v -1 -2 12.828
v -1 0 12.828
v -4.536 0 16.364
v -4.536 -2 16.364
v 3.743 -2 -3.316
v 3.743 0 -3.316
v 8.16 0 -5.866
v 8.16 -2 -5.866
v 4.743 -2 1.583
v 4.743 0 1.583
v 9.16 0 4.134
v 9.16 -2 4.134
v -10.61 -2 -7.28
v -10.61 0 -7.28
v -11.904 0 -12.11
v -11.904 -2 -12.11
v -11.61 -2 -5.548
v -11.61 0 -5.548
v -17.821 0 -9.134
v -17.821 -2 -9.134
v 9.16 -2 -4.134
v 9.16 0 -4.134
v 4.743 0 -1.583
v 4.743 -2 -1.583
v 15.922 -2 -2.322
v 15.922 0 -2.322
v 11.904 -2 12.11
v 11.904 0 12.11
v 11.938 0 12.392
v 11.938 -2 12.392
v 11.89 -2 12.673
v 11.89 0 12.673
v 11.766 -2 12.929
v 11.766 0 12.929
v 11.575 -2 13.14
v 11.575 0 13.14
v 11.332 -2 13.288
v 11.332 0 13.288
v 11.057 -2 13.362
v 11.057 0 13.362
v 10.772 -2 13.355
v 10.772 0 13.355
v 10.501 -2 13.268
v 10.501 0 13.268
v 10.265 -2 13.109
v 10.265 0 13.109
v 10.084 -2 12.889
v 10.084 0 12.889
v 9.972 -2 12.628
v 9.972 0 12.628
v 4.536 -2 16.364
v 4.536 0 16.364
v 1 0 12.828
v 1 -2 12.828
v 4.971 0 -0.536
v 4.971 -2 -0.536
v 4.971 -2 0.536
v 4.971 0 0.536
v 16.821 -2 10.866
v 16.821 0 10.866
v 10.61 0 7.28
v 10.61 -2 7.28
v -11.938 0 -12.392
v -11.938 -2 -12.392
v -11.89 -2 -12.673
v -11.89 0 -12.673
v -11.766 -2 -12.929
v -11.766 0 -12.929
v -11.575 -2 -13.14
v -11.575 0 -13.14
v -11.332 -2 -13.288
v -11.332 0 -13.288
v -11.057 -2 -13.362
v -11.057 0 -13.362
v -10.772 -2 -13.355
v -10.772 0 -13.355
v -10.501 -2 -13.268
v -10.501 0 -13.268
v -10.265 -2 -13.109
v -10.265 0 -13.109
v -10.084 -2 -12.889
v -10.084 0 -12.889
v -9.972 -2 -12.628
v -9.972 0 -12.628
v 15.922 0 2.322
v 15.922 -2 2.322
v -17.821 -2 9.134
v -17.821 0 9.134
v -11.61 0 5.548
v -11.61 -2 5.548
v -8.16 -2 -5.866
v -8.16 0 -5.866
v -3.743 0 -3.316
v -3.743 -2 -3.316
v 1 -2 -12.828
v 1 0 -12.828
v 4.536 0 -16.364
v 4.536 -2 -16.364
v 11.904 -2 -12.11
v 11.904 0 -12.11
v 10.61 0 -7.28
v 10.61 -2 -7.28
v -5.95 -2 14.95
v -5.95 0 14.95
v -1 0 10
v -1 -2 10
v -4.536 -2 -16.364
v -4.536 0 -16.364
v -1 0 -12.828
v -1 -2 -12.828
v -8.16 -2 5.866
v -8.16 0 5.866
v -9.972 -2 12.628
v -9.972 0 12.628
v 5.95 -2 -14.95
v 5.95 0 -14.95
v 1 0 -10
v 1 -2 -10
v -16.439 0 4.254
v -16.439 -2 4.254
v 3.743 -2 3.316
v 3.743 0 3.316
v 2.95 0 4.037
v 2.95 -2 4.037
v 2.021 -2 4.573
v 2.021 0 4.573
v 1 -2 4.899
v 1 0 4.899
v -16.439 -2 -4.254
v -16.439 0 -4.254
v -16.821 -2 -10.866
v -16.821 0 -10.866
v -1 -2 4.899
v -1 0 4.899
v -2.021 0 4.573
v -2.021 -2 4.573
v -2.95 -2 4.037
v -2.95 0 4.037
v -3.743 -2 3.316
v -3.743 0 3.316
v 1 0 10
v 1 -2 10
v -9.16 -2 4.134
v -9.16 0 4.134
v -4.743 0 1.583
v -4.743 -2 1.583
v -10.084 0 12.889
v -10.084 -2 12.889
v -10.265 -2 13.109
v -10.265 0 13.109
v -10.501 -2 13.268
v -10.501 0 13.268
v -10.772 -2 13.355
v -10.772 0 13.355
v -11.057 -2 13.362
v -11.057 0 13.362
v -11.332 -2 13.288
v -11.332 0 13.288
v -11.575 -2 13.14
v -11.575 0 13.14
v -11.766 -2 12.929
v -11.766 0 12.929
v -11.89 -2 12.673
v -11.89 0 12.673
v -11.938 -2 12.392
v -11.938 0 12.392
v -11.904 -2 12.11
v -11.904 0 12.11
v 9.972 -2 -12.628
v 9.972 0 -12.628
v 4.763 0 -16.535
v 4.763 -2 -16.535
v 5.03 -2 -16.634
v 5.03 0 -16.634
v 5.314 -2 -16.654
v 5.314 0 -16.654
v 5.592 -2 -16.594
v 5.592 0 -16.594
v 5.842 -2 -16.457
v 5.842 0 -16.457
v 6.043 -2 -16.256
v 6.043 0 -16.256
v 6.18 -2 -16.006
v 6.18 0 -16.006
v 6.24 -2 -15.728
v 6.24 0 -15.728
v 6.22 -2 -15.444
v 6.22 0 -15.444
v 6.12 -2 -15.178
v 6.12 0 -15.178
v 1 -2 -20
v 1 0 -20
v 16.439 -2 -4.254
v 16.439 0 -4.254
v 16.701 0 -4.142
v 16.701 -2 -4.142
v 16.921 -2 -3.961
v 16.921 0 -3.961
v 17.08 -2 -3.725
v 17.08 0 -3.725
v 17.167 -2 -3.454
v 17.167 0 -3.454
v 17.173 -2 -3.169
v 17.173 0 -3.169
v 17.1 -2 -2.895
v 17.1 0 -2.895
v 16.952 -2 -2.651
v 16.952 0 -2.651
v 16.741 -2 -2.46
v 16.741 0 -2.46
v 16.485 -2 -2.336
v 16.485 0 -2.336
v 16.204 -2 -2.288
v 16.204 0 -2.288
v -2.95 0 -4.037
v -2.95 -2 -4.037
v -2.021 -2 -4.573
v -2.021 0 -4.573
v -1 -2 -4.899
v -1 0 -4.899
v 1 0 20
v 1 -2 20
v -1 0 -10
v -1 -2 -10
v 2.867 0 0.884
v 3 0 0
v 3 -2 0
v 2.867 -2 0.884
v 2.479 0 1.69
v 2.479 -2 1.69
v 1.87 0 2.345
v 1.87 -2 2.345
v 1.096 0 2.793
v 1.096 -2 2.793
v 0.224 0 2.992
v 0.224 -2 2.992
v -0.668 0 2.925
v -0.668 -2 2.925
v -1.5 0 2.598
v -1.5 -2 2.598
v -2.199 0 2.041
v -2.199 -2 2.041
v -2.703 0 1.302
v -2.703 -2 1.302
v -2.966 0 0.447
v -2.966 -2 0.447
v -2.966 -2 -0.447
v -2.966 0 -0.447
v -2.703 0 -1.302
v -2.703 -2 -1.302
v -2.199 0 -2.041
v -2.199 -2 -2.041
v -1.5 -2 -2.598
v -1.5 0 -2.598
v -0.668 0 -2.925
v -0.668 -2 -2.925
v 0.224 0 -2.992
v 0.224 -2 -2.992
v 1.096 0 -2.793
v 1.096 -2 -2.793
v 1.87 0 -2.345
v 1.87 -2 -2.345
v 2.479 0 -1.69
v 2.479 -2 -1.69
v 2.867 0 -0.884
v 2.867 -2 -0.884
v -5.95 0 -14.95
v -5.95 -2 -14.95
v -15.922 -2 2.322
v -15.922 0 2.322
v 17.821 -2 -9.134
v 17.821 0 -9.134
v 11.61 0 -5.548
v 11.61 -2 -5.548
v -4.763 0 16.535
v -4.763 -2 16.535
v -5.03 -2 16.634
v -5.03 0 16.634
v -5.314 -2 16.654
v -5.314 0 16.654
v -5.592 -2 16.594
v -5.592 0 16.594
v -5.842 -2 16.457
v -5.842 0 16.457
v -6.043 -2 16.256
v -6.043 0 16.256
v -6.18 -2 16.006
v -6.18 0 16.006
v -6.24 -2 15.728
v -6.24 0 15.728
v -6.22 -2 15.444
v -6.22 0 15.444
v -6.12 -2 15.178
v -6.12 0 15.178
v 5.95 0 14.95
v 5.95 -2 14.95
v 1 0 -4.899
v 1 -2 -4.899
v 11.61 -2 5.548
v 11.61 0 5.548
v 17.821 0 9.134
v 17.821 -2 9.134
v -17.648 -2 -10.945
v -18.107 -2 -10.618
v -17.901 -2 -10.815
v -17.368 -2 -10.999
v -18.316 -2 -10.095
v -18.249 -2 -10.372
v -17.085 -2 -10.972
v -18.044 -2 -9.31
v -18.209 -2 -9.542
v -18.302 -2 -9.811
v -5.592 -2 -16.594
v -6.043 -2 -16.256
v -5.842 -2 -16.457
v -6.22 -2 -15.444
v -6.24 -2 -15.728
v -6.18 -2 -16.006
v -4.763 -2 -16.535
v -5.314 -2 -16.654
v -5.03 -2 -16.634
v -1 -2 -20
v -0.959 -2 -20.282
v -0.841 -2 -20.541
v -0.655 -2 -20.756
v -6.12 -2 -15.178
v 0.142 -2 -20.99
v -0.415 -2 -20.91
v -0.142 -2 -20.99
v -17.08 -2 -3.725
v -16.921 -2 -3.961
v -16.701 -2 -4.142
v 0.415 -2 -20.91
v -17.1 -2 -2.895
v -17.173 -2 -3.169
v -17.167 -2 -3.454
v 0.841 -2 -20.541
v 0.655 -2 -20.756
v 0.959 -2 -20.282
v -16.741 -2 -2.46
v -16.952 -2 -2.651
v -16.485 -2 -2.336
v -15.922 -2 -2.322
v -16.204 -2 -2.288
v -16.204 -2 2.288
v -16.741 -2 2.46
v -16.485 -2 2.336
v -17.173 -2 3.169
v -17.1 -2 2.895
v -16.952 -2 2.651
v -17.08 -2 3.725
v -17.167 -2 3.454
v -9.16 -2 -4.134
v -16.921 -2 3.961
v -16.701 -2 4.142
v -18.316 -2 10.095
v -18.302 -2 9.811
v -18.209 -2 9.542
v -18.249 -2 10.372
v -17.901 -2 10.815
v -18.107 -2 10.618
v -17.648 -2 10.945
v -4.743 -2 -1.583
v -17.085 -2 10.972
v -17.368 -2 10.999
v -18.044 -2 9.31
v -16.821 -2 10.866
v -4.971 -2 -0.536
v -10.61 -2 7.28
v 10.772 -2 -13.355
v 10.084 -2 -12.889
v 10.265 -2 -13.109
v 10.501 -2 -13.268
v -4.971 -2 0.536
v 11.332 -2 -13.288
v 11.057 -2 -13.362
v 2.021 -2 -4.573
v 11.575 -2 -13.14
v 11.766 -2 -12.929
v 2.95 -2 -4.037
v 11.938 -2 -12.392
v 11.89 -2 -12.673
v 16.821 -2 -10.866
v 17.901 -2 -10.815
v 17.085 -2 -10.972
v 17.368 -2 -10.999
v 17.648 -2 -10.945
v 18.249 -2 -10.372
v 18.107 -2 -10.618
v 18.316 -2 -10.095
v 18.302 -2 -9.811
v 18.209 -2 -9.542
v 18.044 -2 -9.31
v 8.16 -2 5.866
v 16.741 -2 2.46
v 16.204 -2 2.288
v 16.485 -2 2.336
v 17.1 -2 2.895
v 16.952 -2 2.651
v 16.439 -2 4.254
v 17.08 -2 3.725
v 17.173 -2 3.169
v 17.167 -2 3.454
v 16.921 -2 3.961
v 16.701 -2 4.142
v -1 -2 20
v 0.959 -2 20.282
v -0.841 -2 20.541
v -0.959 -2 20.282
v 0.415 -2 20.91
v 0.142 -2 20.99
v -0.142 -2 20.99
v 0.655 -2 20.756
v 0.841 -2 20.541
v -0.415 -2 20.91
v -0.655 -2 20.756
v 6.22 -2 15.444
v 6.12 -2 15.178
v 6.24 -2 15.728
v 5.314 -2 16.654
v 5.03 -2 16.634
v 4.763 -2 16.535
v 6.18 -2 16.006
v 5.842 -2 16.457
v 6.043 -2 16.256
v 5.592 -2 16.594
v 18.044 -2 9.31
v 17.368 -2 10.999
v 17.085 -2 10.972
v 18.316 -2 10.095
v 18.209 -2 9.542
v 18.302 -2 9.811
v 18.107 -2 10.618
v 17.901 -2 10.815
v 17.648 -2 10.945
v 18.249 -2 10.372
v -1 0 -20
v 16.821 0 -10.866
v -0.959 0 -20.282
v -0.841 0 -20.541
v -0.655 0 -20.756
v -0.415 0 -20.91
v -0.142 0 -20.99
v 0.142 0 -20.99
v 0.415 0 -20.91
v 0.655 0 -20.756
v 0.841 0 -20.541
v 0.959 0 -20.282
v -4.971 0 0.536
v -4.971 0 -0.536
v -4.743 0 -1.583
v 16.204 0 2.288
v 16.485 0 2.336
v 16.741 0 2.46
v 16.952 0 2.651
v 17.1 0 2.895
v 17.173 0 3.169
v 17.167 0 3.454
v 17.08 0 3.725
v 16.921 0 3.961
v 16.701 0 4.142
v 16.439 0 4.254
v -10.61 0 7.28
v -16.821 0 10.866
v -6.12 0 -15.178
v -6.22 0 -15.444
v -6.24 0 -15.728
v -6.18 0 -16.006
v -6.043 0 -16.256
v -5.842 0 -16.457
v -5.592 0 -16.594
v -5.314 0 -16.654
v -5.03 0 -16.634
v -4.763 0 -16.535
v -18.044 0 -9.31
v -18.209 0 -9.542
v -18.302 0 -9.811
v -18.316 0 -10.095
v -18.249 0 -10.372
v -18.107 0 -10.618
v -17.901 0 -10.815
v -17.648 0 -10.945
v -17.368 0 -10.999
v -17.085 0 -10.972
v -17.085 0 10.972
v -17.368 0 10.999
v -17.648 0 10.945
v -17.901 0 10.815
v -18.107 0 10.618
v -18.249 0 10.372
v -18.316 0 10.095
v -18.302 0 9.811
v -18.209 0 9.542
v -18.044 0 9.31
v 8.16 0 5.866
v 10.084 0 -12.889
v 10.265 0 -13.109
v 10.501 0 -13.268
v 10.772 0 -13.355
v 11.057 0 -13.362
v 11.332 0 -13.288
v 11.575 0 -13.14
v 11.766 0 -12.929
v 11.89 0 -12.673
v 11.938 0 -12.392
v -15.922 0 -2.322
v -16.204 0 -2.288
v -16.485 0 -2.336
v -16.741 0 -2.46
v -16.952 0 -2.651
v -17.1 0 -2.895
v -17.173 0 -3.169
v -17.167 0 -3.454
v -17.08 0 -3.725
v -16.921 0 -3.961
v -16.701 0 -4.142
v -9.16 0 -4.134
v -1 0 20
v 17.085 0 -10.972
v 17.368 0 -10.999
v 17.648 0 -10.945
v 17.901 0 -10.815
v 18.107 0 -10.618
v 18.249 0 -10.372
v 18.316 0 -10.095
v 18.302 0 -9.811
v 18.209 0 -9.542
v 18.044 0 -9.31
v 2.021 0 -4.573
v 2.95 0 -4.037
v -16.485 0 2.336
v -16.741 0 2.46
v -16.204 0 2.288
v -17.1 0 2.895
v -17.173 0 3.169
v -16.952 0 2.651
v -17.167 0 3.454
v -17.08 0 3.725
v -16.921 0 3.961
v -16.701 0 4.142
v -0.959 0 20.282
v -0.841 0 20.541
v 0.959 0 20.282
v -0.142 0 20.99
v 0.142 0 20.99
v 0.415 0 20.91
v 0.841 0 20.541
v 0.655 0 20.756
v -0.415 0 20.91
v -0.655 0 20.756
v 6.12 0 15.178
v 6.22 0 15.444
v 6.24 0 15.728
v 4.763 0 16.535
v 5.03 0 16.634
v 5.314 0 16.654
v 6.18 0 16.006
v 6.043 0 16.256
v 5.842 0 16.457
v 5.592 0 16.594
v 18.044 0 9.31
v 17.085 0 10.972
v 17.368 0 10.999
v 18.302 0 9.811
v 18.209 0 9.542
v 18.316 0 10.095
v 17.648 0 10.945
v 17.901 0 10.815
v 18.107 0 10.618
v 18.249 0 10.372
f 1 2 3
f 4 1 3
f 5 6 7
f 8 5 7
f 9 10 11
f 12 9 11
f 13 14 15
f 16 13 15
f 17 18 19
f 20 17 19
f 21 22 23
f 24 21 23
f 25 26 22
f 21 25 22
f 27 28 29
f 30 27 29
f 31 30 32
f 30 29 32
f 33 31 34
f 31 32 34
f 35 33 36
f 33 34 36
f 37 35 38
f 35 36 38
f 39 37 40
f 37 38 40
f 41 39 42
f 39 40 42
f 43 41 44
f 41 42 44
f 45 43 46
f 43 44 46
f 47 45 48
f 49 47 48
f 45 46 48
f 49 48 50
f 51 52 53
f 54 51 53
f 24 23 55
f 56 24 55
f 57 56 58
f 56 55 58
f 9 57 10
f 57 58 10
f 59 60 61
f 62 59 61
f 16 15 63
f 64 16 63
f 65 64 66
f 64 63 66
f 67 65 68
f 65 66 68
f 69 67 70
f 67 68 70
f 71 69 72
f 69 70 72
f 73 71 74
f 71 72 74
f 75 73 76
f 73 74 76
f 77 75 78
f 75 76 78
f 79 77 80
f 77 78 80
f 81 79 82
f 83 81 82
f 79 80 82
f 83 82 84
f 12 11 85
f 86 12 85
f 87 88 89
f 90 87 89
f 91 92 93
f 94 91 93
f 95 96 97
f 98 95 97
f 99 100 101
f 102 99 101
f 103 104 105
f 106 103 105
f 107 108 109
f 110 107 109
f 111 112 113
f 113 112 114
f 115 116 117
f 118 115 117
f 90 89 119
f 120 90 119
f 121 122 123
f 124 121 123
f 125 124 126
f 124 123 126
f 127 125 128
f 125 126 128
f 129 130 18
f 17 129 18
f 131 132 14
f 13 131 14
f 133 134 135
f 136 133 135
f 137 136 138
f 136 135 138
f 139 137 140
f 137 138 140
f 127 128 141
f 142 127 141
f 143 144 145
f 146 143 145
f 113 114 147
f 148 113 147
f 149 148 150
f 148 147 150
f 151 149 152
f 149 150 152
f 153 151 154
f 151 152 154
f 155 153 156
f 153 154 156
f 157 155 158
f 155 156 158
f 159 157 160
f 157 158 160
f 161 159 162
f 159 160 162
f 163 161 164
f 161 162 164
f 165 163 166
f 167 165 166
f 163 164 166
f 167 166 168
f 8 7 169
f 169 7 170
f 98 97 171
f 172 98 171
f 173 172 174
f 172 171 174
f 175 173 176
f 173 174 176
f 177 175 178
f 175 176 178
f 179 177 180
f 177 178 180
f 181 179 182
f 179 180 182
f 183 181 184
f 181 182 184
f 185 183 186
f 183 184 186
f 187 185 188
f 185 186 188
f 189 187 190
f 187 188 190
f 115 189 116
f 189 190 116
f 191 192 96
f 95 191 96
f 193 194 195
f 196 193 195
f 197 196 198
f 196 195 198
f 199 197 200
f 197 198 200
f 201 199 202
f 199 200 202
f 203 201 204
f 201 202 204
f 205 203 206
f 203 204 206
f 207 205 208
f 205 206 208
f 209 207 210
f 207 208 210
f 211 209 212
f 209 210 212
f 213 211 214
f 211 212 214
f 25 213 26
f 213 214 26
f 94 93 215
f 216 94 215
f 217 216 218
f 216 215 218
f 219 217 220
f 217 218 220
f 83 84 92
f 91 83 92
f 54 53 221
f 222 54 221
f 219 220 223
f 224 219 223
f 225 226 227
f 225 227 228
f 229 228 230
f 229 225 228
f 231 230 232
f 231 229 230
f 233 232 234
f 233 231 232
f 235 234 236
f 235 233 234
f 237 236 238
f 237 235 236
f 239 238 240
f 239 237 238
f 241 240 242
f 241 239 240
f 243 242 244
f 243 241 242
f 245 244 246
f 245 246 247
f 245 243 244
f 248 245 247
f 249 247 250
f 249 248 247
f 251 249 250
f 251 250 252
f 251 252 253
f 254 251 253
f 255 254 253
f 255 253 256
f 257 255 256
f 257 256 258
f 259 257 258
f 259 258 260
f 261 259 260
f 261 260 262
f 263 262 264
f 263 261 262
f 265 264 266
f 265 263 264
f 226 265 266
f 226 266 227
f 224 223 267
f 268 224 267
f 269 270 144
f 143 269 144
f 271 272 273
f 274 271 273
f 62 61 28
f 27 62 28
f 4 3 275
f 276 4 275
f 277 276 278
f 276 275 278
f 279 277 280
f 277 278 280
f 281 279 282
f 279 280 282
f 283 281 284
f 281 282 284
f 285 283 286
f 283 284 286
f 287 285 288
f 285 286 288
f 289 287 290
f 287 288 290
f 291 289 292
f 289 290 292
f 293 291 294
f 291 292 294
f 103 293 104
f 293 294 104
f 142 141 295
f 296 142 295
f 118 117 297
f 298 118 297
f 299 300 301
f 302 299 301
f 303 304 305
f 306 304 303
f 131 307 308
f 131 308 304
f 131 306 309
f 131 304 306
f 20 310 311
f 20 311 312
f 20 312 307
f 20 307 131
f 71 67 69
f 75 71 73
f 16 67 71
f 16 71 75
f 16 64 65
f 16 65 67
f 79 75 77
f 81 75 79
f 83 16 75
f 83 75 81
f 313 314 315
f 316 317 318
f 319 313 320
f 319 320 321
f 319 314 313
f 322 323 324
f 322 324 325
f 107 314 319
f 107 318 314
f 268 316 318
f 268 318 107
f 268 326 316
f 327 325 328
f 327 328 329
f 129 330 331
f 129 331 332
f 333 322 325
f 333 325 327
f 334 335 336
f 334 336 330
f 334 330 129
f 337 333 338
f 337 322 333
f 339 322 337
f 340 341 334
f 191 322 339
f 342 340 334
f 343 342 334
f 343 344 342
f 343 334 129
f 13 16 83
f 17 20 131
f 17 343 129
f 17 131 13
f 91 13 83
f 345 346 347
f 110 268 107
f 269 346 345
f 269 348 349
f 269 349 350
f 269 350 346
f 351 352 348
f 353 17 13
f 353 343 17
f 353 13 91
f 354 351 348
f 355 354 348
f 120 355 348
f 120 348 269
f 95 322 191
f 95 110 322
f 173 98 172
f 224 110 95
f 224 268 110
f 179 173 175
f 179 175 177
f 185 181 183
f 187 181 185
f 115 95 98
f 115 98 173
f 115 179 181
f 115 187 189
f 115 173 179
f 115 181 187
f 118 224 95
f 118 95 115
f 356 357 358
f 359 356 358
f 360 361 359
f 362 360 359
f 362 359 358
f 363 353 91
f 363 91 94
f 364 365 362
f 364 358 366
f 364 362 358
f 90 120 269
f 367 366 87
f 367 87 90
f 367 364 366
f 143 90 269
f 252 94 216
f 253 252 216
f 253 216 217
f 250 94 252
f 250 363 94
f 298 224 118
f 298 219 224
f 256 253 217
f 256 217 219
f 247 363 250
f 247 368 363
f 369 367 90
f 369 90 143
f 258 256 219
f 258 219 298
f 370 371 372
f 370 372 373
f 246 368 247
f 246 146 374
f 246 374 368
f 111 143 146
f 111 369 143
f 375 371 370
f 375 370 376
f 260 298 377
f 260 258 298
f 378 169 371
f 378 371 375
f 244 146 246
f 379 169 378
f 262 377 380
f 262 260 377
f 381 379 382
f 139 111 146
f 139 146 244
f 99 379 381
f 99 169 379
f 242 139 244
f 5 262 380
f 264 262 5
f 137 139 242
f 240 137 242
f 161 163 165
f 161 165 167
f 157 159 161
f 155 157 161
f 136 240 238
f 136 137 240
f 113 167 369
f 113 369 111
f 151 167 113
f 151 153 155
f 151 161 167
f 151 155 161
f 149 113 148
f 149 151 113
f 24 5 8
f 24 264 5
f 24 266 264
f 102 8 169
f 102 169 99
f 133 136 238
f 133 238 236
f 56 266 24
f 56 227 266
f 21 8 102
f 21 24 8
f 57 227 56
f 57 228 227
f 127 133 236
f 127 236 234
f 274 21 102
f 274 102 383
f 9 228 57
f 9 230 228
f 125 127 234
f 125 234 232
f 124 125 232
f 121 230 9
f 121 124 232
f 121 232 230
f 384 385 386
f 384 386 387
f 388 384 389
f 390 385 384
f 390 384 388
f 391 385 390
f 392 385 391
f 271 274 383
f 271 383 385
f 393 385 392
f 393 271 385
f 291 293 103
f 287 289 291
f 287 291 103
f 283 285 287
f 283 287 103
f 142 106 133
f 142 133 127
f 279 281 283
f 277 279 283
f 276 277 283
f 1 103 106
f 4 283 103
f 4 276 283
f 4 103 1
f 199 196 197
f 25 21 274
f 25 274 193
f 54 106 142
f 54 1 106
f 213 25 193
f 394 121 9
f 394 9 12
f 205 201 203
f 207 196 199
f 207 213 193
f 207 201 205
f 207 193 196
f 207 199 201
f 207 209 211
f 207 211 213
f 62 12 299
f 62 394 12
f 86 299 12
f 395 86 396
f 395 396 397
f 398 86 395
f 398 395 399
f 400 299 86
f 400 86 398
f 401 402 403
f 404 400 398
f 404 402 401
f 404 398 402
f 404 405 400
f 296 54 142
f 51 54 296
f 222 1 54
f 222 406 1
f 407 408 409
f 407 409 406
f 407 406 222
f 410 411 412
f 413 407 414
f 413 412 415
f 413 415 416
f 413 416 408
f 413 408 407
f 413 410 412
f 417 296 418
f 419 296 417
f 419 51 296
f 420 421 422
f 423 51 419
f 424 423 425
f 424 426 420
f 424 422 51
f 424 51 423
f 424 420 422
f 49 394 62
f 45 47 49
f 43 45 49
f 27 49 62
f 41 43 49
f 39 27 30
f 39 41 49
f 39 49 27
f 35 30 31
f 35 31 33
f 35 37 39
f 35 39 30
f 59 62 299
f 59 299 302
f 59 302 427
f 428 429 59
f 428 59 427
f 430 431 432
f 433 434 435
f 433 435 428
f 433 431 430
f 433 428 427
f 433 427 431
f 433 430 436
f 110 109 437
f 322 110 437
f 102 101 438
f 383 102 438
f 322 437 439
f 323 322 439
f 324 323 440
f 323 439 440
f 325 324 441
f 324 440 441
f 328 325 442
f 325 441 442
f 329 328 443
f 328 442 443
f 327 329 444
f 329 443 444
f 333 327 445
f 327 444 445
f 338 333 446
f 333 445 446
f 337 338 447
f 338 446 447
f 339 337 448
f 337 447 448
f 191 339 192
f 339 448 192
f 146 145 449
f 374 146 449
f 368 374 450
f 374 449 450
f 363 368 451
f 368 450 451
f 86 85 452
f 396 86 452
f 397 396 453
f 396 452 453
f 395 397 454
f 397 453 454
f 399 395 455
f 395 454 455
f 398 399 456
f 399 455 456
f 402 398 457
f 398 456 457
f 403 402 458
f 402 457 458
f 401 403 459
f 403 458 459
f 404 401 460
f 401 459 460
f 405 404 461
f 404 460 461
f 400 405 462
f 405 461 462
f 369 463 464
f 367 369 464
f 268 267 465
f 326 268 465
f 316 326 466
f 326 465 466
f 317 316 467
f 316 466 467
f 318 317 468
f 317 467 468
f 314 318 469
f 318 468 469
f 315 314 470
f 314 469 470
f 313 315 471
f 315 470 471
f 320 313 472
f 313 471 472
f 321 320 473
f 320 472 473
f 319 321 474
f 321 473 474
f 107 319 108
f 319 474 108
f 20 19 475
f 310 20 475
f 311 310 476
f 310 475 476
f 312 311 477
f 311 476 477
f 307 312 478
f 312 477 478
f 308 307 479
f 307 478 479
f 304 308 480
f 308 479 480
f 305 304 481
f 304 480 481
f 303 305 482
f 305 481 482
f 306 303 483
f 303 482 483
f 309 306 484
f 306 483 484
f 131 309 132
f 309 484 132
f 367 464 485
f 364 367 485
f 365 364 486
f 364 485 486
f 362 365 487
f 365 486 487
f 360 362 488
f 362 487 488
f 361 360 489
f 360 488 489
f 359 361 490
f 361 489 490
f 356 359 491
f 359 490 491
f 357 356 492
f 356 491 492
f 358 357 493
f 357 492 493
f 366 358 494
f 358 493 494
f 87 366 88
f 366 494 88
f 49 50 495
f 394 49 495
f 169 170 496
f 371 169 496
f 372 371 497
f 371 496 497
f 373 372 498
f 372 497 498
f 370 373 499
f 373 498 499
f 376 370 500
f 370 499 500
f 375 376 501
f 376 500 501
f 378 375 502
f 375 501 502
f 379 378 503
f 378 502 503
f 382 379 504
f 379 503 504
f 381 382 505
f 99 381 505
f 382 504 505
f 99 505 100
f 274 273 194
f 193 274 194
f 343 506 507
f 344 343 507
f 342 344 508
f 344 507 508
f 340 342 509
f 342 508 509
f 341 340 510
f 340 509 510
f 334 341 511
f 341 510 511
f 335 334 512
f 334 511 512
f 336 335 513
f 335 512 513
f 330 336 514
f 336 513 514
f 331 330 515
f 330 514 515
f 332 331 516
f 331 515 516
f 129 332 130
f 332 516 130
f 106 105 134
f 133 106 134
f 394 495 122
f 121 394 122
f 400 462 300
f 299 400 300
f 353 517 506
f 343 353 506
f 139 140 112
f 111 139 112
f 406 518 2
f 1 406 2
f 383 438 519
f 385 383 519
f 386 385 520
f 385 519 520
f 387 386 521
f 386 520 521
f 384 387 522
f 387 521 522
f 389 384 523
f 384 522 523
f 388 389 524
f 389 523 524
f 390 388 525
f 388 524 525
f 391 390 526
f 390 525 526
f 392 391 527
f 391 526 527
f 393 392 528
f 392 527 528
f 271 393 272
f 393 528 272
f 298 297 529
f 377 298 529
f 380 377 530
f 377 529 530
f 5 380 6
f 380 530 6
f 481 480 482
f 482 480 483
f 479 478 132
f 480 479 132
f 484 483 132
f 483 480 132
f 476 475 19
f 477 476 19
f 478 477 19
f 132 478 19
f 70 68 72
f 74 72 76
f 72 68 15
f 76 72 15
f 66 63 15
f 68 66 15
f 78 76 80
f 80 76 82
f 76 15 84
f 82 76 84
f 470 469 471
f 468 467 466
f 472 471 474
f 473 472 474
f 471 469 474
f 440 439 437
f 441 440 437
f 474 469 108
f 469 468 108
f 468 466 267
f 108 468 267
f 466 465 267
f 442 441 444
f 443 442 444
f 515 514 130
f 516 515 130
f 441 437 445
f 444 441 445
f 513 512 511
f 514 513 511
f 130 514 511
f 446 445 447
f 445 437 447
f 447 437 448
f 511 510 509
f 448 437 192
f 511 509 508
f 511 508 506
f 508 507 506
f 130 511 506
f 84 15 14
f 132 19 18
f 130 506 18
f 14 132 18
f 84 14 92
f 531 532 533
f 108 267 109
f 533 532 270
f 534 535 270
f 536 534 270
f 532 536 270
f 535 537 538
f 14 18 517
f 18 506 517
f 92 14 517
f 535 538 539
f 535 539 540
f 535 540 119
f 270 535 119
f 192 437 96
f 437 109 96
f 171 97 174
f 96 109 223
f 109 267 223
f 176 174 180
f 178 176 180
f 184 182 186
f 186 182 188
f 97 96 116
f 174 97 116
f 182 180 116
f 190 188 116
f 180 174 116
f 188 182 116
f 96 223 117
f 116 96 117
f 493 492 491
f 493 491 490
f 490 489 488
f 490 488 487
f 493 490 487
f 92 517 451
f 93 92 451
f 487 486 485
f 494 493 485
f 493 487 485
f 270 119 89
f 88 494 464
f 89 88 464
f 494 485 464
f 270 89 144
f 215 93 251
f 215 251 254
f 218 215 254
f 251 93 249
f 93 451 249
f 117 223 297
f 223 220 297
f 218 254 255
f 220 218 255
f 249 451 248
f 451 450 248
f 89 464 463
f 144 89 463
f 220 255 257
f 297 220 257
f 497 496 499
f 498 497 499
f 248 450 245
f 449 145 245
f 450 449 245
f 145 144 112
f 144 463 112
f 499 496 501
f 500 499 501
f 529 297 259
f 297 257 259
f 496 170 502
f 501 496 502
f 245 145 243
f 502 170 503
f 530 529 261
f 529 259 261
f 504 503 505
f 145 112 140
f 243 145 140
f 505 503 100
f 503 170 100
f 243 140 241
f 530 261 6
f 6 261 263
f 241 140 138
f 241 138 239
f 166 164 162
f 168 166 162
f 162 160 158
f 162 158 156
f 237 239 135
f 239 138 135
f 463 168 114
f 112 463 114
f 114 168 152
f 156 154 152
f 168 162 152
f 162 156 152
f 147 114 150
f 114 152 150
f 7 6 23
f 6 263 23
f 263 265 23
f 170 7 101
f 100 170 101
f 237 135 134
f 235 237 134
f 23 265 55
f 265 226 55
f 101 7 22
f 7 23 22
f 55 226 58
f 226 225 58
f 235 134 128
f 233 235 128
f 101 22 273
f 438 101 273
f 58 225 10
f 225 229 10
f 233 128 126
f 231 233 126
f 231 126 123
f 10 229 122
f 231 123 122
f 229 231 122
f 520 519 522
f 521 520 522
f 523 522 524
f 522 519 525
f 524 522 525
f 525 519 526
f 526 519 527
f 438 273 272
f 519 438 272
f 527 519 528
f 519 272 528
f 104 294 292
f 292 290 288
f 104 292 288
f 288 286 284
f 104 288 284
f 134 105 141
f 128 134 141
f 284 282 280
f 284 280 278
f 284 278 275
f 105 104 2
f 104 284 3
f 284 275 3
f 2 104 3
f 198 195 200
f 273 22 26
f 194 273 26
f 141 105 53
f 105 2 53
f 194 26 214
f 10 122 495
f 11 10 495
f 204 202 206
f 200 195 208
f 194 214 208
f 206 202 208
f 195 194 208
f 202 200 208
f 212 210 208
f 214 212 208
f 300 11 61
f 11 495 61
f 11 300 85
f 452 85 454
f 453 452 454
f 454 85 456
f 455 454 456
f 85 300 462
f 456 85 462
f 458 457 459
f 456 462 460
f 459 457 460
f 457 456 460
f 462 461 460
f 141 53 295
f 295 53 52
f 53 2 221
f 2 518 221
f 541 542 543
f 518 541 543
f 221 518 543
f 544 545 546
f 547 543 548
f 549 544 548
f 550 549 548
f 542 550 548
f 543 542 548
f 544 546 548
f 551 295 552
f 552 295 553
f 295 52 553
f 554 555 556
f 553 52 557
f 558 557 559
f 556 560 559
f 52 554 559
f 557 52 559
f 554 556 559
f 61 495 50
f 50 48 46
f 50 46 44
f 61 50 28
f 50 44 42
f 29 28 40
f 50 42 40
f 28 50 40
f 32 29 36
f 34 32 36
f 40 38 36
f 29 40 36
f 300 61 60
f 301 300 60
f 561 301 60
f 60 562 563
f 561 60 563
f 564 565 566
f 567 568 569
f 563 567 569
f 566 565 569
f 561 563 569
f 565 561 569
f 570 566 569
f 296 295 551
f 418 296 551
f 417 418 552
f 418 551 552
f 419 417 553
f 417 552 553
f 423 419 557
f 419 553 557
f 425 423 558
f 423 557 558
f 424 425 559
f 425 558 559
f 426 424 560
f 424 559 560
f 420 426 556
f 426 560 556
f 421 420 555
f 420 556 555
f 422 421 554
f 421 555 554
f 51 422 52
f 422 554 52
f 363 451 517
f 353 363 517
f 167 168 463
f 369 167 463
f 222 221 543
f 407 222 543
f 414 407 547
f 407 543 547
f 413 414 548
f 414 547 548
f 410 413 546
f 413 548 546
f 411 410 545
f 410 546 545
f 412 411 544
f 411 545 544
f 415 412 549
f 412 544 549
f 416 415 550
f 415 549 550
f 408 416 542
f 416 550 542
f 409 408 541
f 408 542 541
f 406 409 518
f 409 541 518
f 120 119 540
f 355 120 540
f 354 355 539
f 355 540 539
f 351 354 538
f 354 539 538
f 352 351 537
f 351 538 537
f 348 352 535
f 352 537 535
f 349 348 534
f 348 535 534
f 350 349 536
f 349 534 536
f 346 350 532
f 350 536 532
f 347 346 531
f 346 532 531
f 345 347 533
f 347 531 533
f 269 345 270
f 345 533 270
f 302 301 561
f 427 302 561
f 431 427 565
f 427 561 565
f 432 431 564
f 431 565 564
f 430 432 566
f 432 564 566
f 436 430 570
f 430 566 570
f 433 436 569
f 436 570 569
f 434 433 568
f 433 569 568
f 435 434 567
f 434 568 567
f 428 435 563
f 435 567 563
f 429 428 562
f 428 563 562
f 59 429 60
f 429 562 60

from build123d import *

# Parameters (mm, degrees)
F0_R     = 3
F1_DEPTH = 2


with BuildPart() as f1:
    # F0 (on Front) → F1 (new body)
    with BuildSketch(Plane.XZ):
        with BuildLine():
            Line((-1, 10), (-1, 4.898979))
            ThreePointArc((-1, 4.898979), (-2.5, 4.330127), (-3.742641, 3.315515))
            Line((-3.742641, 3.315515), (-8.160254, 5.866025))
            Line((-8.160254, 5.866025), (-9.971987, 12.627506))
            ThreePointArc((-9.971987, 12.627506), (-11.196732, 13.334613), (-11.903839, 12.109868))
            Line((-11.903839, 12.109868), (-10.609744, 7.280239))
            Line((-10.609744, 7.280239), (-16.820508, 10.866025))
            ThreePointArc((-16.820508, 10.866025), (-18.186533, 10.5), (-17.820508, 9.133975))
            Line((-17.820508, 9.133975), (-11.609744, 5.548188))
            Line((-11.609744, 5.548188), (-16.439373, 4.254093))
            ThreePointArc((-16.439373, 4.254093), (-17.14648, 3.029348), (-15.921735, 2.322241))
            Line((-15.921735, 2.322241), (-9.160254, 4.133975))
            Line((-9.160254, 4.133975), (-4.742641, 1.583464))
            ThreePointArc((-4.742641, 1.583464), (-5, 0), (-4.742641, -1.583464))
            Line((-4.742641, -1.583464), (-9.160254, -4.133975))
            Line((-9.160254, -4.133975), (-15.921735, -2.322241))
            ThreePointArc((-15.921735, -2.322241), (-17.14648, -3.029348), (-16.439373, -4.254093))
            Line((-16.439373, -4.254093), (-11.609744, -5.548188))
            Line((-11.609744, -5.548188), (-17.820508, -9.133975))
            ThreePointArc((-17.820508, -9.133975), (-18.186533, -10.5), (-16.820508, -10.866025))
            Line((-16.820508, -10.866025), (-10.609744, -7.280239))
            Line((-10.609744, -7.280239), (-11.903839, -12.109868))
            ThreePointArc((-11.903839, -12.109868), (-11.196732, -13.334613), (-9.971987, -12.627506))
            Line((-9.971987, -12.627506), (-8.160254, -5.866025))
            Line((-8.160254, -5.866025), (-3.742641, -3.315515))
            ThreePointArc((-3.742641, -3.315515), (-2.5, -4.330127), (-1, -4.898979))
            Line((-1, -4.898979), (-1, -10))
            Line((-1, -10), (-5.949747, -14.949747))
            ThreePointArc((-5.949747, -14.949747), (-5.949747, -16.363961), (-4.535534, -16.363961))
            Line((-4.535534, -16.363961), (-1, -12.828427))
            Line((-1, -12.828427), (-1, -20))
            ThreePointArc((-1, -20), (0, -21), (1, -20))
            Line((1, -20), (1, -12.828427))
            Line((1, -12.828427), (4.535534, -16.363961))
            ThreePointArc((4.535534, -16.363961), (5.949747, -16.363961), (5.949747, -14.949747))
            Line((5.949747, -14.949747), (1, -10))
            Line((1, -10), (1, -4.898979))
            ThreePointArc((1, -4.898979), (2.5, -4.330127), (3.742641, -3.315515))
            Line((3.742641, -3.315515), (8.160254, -5.866025))
            Line((8.160254, -5.866025), (9.971987, -12.627506))
            ThreePointArc((9.971987, -12.627506), (11.196732, -13.334613), (11.903839, -12.109868))
            Line((11.903839, -12.109868), (10.609744, -7.280239))
            Line((10.609744, -7.280239), (16.820508, -10.866025))
            ThreePointArc((16.820508, -10.866025), (18.186533, -10.5), (17.820508, -9.133975))
            Line((17.820508, -9.133975), (11.609744, -5.548188))
            Line((11.609744, -5.548188), (16.439373, -4.254093))
            ThreePointArc((16.439373, -4.254093), (17.14648, -3.029348), (15.921735, -2.322241))
            Line((15.921735, -2.322241), (9.160254, -4.133975))
            Line((9.160254, -4.133975), (4.742641, -1.583464))
            ThreePointArc((4.742641, -1.583464), (5, 0), (4.742641, 1.583464))
            Line((4.742641, 1.583464), (9.160254, 4.133975))
            Line((9.160254, 4.133975), (15.921735, 2.322241))
            ThreePointArc((15.921735, 2.322241), (17.14648, 3.029348), (16.439373, 4.254093))
            Line((16.439373, 4.254093), (11.609744, 5.548188))
            Line((11.609744, 5.548188), (17.820508, 9.133975))
            ThreePointArc((17.820508, 9.133975), (18.186533, 10.5), (16.820508, 10.866025))
            Line((16.820508, 10.866025), (10.609744, 7.280239))
            Line((10.609744, 7.280239), (11.903839, 12.109868))
            ThreePointArc((11.903839, 12.109868), (11.196732, 13.334613), (9.971987, 12.627506))
            Line((9.971987, 12.627506), (8.160254, 5.866025))
            Line((8.160254, 5.866025), (3.742641, 3.315515))
            ThreePointArc((3.742641, 3.315515), (2.5, 4.330127), (1, 4.898979))
            Line((1, 4.898979), (1, 10))
            Line((1, 10), (5.949747, 14.949747))
            ThreePointArc((5.949747, 14.949747), (5.949747, 16.363961), (4.535534, 16.363961))
            Line((4.535534, 16.363961), (1, 12.828427))
            Line((1, 12.828427), (1, 20))
            ThreePointArc((1, 20), (0, 21), (-1, 20))
            Line((-1, 20), (-1, 12.828427))
            Line((-1, 12.828427), (-4.535534, 16.363961))
            ThreePointArc((-4.535534, 16.363961), (-5.949747, 16.363961), (-5.949747, 14.949747))
            Line((-5.949747, 14.949747), (-1, 10))
        make_face()
        Circle(F0_R, mode=Mode.SUBTRACT)
    extrude(amount=F1_DEPTH)


solid = f1.part
